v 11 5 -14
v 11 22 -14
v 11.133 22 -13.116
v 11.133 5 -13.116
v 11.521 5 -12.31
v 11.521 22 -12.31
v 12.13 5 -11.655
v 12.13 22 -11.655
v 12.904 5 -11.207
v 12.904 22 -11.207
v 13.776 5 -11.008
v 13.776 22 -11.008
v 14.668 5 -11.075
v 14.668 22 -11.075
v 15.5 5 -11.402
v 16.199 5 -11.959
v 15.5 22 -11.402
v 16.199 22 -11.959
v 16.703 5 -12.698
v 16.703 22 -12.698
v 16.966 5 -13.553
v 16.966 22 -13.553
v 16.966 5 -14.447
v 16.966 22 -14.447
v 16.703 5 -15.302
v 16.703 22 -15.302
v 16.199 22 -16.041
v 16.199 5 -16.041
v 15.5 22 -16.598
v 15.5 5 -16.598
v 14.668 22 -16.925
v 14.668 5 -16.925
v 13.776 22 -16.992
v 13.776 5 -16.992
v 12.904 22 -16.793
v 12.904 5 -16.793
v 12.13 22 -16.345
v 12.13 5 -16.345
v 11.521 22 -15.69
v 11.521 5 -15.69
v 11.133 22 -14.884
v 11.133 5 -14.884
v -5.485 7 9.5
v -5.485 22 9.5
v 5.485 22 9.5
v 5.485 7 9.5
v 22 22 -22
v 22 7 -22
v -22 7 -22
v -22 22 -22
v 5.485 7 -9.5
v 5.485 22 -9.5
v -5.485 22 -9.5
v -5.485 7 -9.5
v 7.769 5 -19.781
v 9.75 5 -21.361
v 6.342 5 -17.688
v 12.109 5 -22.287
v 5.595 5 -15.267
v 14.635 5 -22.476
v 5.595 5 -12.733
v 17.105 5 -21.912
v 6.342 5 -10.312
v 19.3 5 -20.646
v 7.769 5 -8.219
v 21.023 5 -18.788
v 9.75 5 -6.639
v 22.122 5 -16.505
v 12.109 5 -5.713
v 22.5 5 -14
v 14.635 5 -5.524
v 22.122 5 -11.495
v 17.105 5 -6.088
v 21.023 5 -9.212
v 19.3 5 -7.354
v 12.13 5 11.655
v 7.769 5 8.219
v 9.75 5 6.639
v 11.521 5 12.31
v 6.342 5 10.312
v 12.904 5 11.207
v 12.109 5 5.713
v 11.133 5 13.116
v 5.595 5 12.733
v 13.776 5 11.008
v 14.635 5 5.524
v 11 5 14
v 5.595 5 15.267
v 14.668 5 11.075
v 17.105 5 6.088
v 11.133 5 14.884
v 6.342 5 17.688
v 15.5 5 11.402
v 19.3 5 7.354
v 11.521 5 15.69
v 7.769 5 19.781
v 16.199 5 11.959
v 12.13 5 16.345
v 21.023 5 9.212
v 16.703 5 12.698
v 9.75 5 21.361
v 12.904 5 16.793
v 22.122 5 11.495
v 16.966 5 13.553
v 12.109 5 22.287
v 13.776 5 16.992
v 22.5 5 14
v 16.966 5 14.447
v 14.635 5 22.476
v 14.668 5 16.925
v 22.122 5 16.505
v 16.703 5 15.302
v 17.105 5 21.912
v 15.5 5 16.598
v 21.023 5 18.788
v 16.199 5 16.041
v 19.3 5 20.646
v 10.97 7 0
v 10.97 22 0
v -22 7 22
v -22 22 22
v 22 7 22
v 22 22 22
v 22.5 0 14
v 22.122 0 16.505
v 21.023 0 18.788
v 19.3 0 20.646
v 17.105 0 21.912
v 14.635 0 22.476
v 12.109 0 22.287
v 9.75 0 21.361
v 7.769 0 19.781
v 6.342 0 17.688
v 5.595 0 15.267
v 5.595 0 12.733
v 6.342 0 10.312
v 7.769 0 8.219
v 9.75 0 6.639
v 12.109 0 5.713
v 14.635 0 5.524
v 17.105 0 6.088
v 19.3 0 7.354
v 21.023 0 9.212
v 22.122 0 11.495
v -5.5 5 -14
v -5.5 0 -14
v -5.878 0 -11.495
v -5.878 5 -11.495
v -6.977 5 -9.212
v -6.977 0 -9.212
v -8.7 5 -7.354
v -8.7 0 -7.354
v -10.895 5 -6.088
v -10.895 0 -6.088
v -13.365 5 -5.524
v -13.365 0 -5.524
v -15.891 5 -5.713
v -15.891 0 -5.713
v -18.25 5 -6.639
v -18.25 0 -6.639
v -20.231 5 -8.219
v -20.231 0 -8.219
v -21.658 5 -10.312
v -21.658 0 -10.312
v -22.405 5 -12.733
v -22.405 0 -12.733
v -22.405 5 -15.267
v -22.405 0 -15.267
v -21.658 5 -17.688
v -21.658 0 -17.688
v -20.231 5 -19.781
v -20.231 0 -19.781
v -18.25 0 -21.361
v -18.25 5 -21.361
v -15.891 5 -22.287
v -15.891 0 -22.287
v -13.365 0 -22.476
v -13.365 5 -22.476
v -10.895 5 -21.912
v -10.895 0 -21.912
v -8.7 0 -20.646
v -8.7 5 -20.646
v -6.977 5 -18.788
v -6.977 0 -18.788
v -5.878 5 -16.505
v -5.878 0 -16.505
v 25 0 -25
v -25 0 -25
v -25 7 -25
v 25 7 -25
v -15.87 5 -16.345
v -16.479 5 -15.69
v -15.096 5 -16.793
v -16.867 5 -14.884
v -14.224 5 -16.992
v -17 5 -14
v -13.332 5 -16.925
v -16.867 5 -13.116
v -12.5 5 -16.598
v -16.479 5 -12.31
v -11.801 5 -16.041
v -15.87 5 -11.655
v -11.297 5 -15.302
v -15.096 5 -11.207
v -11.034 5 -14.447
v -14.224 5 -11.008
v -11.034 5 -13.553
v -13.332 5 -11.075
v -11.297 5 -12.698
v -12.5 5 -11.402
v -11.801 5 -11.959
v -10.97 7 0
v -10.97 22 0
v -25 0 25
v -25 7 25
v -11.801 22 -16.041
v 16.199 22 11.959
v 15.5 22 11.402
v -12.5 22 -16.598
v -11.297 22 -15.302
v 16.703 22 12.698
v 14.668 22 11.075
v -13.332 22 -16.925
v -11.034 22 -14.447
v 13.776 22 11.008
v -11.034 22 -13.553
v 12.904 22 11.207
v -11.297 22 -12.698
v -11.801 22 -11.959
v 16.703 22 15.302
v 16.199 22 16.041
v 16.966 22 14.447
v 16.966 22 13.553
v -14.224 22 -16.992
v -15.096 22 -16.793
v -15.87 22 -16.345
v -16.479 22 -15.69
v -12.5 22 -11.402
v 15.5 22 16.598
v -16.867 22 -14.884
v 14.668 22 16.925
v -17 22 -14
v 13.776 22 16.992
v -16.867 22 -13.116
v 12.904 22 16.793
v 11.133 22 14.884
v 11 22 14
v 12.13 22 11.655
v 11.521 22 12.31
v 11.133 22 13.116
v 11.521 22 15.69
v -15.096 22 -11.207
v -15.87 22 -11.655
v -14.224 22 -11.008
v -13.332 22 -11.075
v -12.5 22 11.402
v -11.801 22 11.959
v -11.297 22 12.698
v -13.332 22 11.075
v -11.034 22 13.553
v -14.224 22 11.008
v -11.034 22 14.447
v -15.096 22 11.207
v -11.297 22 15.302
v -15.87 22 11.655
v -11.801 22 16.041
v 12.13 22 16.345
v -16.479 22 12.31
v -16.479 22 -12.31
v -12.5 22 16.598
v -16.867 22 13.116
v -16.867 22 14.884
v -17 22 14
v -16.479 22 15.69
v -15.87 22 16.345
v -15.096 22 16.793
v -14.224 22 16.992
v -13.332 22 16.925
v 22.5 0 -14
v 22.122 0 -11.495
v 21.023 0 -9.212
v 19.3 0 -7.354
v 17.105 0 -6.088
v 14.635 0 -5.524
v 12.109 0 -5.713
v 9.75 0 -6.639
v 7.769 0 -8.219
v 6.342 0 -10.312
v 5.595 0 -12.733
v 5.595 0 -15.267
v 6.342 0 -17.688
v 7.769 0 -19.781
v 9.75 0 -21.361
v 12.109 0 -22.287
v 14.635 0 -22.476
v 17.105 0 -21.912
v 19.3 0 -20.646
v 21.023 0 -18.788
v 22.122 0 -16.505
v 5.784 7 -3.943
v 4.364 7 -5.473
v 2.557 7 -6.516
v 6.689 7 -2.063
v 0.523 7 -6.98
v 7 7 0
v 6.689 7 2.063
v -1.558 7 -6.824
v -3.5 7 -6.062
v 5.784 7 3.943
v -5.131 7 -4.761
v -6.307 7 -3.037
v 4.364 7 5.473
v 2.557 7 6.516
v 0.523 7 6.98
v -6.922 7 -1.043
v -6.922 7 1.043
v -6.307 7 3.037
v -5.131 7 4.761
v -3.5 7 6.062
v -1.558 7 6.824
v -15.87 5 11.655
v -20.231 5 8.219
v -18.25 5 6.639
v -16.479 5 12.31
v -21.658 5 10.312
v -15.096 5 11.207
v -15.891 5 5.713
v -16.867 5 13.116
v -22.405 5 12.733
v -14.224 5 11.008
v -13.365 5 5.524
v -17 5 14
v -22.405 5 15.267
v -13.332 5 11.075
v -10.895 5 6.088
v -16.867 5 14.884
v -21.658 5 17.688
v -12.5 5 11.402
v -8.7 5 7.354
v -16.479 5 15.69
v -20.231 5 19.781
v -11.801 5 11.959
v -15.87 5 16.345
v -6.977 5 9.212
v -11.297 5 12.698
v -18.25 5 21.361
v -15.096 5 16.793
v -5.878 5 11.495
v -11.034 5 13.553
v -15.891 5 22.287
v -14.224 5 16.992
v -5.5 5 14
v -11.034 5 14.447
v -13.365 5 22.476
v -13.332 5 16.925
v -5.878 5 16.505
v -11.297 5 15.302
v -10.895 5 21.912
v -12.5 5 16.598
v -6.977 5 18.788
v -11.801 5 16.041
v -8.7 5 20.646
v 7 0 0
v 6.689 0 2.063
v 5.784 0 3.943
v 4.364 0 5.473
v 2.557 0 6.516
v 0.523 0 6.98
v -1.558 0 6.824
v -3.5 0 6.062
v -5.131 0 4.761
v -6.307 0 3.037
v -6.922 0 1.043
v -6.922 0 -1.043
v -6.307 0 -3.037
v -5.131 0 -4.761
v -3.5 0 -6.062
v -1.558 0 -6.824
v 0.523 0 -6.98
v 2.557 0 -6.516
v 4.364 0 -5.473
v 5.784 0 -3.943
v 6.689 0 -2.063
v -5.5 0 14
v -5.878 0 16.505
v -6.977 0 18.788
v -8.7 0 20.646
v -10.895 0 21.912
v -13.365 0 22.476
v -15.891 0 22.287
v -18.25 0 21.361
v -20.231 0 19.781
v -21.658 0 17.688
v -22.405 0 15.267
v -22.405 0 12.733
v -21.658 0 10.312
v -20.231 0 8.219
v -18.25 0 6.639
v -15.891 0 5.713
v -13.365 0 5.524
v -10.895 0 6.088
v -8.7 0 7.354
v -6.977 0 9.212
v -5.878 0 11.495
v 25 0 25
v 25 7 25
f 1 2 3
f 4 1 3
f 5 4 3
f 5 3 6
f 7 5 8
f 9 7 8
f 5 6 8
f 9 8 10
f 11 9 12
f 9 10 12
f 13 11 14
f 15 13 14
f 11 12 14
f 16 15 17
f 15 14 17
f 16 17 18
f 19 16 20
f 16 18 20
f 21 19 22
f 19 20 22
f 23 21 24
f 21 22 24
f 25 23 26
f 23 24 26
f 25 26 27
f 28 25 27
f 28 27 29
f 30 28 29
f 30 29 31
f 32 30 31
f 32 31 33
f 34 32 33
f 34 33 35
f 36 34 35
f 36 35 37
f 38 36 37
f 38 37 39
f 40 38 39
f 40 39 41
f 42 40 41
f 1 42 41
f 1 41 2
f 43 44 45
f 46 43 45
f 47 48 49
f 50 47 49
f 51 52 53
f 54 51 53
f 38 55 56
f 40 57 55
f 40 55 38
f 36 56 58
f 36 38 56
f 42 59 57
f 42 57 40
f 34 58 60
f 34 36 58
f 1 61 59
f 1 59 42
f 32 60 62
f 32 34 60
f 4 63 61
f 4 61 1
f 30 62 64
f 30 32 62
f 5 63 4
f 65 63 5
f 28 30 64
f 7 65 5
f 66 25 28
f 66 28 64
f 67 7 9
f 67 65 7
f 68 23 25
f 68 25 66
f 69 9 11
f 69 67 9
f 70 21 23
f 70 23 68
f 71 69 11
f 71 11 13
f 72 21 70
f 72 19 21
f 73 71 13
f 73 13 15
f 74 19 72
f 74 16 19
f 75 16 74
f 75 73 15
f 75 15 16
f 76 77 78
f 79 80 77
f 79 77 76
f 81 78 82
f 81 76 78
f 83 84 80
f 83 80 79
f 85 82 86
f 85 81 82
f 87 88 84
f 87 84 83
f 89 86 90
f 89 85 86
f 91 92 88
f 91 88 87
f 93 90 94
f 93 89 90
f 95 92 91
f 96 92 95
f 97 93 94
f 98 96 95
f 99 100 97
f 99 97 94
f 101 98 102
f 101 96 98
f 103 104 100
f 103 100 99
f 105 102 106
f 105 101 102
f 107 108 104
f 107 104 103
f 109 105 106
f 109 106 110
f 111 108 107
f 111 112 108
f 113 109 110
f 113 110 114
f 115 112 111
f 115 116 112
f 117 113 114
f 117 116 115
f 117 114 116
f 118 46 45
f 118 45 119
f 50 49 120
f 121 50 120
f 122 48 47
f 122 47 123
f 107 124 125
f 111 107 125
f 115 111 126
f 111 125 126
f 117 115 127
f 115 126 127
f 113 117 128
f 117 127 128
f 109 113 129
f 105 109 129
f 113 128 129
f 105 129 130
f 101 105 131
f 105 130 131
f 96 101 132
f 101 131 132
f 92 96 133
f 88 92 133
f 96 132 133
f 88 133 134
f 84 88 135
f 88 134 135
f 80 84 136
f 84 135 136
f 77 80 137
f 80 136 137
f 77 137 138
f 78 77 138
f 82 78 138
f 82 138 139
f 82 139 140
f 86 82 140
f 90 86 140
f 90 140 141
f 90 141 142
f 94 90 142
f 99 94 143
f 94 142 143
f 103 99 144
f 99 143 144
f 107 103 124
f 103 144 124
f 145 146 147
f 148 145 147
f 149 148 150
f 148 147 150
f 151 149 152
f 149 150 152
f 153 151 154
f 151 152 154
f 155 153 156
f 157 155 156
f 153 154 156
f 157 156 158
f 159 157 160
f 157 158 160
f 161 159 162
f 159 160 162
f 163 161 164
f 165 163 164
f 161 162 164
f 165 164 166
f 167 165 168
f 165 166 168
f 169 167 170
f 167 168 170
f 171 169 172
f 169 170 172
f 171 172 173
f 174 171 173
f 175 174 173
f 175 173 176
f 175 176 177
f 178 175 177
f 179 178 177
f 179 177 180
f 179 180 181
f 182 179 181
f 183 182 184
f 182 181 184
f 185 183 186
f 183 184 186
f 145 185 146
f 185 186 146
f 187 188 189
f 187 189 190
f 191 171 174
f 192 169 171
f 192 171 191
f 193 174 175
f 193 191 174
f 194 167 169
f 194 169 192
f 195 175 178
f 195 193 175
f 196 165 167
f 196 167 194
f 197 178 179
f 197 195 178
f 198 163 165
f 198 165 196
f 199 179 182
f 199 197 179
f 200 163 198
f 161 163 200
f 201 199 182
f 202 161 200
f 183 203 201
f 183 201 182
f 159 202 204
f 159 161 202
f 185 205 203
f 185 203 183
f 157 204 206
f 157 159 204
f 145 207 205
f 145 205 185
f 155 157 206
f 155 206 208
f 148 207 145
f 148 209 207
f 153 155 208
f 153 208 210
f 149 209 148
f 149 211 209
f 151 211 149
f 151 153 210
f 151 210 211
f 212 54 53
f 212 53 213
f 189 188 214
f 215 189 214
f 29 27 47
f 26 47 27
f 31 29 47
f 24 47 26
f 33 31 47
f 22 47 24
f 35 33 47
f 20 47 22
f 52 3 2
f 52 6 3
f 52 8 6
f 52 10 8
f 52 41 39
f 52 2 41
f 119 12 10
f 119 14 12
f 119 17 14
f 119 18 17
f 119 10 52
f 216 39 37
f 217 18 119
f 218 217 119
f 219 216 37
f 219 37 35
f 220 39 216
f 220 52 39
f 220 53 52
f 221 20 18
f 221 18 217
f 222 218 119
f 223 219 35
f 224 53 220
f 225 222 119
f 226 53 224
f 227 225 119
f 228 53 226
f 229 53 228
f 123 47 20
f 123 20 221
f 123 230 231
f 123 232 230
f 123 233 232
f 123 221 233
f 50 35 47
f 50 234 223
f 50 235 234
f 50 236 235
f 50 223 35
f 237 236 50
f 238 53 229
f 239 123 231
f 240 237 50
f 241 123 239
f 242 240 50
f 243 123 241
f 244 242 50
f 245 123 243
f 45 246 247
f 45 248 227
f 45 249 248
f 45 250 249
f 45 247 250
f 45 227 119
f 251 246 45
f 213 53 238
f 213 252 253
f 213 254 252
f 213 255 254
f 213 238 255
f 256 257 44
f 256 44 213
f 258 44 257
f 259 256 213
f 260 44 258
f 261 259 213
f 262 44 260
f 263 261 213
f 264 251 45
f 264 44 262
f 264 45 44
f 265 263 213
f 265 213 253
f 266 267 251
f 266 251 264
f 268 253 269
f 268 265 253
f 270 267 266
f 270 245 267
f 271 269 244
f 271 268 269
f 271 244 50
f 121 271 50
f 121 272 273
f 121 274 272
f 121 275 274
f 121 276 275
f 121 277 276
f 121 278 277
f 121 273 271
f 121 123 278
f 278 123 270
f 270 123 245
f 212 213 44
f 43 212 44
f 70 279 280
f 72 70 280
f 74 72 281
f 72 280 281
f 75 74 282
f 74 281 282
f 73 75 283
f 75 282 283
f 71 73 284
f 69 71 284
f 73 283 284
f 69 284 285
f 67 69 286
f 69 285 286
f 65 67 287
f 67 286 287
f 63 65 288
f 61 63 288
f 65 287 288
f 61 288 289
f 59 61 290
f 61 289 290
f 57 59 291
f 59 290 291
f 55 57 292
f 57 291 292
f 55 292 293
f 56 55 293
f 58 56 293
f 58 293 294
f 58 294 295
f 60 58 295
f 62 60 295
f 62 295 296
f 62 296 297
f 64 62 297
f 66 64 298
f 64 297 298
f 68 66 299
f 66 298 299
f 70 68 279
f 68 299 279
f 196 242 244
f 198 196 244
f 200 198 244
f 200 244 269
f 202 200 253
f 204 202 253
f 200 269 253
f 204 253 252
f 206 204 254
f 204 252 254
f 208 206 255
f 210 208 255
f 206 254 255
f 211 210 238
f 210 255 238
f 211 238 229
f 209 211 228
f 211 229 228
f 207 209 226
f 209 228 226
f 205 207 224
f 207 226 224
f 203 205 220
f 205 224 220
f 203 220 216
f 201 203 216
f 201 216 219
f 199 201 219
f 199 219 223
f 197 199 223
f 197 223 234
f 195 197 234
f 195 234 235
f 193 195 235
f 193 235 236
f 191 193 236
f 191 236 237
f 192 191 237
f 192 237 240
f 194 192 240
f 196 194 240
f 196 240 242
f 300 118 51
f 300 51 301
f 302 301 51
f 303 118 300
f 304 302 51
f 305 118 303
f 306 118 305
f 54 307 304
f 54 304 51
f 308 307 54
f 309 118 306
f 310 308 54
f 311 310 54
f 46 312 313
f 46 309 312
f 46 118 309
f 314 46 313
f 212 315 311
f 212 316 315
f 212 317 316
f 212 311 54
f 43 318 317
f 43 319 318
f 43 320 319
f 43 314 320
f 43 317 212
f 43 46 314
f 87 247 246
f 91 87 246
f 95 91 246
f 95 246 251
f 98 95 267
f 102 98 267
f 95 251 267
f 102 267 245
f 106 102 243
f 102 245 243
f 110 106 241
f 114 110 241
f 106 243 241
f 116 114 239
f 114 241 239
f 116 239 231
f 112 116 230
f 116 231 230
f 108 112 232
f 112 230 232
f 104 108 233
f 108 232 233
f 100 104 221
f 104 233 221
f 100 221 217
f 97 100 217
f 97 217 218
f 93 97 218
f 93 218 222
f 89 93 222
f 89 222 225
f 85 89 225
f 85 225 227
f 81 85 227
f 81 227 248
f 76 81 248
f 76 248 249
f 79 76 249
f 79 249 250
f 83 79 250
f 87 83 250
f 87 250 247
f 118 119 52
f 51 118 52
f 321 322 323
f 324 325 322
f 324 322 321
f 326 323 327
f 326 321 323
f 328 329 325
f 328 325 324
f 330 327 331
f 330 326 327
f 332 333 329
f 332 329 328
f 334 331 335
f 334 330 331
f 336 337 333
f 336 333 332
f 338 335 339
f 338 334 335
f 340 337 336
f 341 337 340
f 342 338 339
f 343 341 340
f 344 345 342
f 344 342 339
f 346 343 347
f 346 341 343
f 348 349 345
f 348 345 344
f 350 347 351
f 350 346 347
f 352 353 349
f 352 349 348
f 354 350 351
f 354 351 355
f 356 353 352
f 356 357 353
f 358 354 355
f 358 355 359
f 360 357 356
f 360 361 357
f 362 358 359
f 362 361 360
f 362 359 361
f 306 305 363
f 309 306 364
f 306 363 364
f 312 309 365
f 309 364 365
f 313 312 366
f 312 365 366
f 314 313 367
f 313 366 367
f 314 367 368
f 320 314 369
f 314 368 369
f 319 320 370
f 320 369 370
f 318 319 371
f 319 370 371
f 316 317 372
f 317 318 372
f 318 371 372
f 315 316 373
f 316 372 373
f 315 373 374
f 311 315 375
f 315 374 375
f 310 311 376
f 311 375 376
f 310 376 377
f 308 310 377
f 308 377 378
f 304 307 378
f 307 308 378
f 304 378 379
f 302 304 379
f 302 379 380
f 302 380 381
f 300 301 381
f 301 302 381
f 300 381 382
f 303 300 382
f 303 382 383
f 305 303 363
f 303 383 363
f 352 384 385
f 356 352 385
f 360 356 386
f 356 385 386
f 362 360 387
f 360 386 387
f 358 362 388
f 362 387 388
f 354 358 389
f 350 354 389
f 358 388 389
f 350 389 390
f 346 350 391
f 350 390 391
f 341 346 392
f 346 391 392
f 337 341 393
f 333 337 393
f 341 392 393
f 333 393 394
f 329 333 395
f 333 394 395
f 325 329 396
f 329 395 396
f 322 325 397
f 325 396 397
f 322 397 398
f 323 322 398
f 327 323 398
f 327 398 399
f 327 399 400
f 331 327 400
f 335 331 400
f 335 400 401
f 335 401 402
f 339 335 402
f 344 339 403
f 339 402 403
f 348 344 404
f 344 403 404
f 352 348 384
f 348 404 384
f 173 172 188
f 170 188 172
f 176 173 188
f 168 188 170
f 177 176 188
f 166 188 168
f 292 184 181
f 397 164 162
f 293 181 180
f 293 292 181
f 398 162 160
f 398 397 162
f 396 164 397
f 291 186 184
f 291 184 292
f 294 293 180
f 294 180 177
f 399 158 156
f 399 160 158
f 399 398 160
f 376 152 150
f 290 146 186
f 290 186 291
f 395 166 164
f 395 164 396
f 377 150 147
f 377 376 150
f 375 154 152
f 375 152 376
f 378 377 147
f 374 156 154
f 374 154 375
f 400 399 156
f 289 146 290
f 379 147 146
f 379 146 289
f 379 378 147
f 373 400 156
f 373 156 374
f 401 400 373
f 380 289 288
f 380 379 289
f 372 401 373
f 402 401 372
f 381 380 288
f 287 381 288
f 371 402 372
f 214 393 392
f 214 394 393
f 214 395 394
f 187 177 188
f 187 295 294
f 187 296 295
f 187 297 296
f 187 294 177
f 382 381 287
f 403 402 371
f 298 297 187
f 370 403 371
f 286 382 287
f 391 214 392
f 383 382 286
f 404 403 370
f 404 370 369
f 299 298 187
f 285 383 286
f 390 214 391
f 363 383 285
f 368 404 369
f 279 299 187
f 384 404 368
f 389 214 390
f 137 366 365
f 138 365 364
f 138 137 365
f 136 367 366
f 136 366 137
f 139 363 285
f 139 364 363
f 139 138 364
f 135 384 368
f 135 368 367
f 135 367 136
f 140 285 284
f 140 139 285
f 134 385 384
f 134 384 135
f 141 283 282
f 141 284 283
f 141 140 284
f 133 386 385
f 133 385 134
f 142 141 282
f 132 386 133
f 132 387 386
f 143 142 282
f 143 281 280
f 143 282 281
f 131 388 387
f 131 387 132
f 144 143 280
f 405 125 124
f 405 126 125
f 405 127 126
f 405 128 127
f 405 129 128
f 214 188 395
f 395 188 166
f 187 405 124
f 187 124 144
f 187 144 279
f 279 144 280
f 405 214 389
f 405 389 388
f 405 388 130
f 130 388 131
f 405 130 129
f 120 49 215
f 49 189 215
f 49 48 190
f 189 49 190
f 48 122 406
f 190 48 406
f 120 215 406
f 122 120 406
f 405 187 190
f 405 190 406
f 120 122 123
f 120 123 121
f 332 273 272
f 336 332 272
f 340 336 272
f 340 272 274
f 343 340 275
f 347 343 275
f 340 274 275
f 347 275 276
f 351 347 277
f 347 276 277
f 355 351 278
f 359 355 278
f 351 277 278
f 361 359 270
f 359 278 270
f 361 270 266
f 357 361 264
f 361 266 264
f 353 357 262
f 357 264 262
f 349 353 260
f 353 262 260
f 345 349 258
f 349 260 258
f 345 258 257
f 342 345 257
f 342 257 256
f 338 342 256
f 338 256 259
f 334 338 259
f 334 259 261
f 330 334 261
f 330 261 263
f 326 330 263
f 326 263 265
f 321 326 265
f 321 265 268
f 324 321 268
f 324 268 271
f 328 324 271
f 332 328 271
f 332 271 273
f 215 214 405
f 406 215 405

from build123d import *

# Parameters (mm, degrees)
F0_W      = 50
F0_H      = 50
F1_DEPTH  = 7
F2_W      = 44
F2_H      = 44
F3_DEPTH  = 15
F4_R      = 3
F5_DEPTH  = 25
F7_R      = 7
F8_DEPTH  = 25
F9_R      = 7
F10_DEPTH = 15
F6_R      = 8.5
F11_DEPTH = 5


# Not quite as in the source:
# - a feature names something its author has since deleted; it is built from what else it names


with BuildPart() as f1:
    # F0 (on Front) → F1 (new body)
    with BuildSketch(Plane.XZ):
        Rectangle(F0_W, F0_H)
    extrude(amount=-F1_DEPTH)

    # F2 (on face) → F3 (join)
    with BuildSketch(Plane(origin=(0, 7, 0), x_dir=(-1, 0, 0), z_dir=(0, 1, 0))):
        Rectangle(F2_W, F2_H)
    extrude(amount=F3_DEPTH)

    # F4 (on face) → F5 (cut)
    with BuildSketch(Plane(origin=(0, 22, 0), x_dir=(-1, 0, 0), z_dir=(0, 1, 0))):
        with Locations((-14, 14)):
            Circle(F4_R)
        with Locations((14, 14)):
            Circle(F4_R)
        with Locations((14, -14)):
            Circle(F4_R)
        with Locations((-14, -14)):
            Circle(F4_R)
    extrude(amount=-F5_DEPTH, mode=Mode.SUBTRACT)

    # F7 (on face) → F8 (cut)
    with BuildSketch(Plane.XZ):
        Circle(F7_R)
    extrude(amount=-F8_DEPTH, mode=Mode.SUBTRACT)

    # F9 (on face) → F10 (cut)
    with BuildSketch(Plane(origin=(0, 22, 0), x_dir=(-1, 0, 0), z_dir=(0, 1, 0))):
        Polygon((-5.4848275573, -9.5), (5.4848275573, -9.5), (10.9696551146, 0), (5.4848275573, 9.5), (-5.4848275573, 9.5), (-10.9696551146, 0), align=None)
        Circle(F9_R, mode=Mode.SUBTRACT)
    extrude(amount=-F10_DEPTH, mode=Mode.SUBTRACT)

    # F6 (on face) → F11 (cut)
    with BuildSketch(Plane.XZ):
        with Locations((-14, 14)):
            Circle(F6_R)
        with Locations((-14, -14)):
            Circle(F6_R)
        with Locations((14, -14)):
            Circle(F6_R)
        with Locations((14, 14)):
            Circle(F6_R)
    extrude(amount=-F11_DEPTH, mode=Mode.SUBTRACT)


solid = f1.part
